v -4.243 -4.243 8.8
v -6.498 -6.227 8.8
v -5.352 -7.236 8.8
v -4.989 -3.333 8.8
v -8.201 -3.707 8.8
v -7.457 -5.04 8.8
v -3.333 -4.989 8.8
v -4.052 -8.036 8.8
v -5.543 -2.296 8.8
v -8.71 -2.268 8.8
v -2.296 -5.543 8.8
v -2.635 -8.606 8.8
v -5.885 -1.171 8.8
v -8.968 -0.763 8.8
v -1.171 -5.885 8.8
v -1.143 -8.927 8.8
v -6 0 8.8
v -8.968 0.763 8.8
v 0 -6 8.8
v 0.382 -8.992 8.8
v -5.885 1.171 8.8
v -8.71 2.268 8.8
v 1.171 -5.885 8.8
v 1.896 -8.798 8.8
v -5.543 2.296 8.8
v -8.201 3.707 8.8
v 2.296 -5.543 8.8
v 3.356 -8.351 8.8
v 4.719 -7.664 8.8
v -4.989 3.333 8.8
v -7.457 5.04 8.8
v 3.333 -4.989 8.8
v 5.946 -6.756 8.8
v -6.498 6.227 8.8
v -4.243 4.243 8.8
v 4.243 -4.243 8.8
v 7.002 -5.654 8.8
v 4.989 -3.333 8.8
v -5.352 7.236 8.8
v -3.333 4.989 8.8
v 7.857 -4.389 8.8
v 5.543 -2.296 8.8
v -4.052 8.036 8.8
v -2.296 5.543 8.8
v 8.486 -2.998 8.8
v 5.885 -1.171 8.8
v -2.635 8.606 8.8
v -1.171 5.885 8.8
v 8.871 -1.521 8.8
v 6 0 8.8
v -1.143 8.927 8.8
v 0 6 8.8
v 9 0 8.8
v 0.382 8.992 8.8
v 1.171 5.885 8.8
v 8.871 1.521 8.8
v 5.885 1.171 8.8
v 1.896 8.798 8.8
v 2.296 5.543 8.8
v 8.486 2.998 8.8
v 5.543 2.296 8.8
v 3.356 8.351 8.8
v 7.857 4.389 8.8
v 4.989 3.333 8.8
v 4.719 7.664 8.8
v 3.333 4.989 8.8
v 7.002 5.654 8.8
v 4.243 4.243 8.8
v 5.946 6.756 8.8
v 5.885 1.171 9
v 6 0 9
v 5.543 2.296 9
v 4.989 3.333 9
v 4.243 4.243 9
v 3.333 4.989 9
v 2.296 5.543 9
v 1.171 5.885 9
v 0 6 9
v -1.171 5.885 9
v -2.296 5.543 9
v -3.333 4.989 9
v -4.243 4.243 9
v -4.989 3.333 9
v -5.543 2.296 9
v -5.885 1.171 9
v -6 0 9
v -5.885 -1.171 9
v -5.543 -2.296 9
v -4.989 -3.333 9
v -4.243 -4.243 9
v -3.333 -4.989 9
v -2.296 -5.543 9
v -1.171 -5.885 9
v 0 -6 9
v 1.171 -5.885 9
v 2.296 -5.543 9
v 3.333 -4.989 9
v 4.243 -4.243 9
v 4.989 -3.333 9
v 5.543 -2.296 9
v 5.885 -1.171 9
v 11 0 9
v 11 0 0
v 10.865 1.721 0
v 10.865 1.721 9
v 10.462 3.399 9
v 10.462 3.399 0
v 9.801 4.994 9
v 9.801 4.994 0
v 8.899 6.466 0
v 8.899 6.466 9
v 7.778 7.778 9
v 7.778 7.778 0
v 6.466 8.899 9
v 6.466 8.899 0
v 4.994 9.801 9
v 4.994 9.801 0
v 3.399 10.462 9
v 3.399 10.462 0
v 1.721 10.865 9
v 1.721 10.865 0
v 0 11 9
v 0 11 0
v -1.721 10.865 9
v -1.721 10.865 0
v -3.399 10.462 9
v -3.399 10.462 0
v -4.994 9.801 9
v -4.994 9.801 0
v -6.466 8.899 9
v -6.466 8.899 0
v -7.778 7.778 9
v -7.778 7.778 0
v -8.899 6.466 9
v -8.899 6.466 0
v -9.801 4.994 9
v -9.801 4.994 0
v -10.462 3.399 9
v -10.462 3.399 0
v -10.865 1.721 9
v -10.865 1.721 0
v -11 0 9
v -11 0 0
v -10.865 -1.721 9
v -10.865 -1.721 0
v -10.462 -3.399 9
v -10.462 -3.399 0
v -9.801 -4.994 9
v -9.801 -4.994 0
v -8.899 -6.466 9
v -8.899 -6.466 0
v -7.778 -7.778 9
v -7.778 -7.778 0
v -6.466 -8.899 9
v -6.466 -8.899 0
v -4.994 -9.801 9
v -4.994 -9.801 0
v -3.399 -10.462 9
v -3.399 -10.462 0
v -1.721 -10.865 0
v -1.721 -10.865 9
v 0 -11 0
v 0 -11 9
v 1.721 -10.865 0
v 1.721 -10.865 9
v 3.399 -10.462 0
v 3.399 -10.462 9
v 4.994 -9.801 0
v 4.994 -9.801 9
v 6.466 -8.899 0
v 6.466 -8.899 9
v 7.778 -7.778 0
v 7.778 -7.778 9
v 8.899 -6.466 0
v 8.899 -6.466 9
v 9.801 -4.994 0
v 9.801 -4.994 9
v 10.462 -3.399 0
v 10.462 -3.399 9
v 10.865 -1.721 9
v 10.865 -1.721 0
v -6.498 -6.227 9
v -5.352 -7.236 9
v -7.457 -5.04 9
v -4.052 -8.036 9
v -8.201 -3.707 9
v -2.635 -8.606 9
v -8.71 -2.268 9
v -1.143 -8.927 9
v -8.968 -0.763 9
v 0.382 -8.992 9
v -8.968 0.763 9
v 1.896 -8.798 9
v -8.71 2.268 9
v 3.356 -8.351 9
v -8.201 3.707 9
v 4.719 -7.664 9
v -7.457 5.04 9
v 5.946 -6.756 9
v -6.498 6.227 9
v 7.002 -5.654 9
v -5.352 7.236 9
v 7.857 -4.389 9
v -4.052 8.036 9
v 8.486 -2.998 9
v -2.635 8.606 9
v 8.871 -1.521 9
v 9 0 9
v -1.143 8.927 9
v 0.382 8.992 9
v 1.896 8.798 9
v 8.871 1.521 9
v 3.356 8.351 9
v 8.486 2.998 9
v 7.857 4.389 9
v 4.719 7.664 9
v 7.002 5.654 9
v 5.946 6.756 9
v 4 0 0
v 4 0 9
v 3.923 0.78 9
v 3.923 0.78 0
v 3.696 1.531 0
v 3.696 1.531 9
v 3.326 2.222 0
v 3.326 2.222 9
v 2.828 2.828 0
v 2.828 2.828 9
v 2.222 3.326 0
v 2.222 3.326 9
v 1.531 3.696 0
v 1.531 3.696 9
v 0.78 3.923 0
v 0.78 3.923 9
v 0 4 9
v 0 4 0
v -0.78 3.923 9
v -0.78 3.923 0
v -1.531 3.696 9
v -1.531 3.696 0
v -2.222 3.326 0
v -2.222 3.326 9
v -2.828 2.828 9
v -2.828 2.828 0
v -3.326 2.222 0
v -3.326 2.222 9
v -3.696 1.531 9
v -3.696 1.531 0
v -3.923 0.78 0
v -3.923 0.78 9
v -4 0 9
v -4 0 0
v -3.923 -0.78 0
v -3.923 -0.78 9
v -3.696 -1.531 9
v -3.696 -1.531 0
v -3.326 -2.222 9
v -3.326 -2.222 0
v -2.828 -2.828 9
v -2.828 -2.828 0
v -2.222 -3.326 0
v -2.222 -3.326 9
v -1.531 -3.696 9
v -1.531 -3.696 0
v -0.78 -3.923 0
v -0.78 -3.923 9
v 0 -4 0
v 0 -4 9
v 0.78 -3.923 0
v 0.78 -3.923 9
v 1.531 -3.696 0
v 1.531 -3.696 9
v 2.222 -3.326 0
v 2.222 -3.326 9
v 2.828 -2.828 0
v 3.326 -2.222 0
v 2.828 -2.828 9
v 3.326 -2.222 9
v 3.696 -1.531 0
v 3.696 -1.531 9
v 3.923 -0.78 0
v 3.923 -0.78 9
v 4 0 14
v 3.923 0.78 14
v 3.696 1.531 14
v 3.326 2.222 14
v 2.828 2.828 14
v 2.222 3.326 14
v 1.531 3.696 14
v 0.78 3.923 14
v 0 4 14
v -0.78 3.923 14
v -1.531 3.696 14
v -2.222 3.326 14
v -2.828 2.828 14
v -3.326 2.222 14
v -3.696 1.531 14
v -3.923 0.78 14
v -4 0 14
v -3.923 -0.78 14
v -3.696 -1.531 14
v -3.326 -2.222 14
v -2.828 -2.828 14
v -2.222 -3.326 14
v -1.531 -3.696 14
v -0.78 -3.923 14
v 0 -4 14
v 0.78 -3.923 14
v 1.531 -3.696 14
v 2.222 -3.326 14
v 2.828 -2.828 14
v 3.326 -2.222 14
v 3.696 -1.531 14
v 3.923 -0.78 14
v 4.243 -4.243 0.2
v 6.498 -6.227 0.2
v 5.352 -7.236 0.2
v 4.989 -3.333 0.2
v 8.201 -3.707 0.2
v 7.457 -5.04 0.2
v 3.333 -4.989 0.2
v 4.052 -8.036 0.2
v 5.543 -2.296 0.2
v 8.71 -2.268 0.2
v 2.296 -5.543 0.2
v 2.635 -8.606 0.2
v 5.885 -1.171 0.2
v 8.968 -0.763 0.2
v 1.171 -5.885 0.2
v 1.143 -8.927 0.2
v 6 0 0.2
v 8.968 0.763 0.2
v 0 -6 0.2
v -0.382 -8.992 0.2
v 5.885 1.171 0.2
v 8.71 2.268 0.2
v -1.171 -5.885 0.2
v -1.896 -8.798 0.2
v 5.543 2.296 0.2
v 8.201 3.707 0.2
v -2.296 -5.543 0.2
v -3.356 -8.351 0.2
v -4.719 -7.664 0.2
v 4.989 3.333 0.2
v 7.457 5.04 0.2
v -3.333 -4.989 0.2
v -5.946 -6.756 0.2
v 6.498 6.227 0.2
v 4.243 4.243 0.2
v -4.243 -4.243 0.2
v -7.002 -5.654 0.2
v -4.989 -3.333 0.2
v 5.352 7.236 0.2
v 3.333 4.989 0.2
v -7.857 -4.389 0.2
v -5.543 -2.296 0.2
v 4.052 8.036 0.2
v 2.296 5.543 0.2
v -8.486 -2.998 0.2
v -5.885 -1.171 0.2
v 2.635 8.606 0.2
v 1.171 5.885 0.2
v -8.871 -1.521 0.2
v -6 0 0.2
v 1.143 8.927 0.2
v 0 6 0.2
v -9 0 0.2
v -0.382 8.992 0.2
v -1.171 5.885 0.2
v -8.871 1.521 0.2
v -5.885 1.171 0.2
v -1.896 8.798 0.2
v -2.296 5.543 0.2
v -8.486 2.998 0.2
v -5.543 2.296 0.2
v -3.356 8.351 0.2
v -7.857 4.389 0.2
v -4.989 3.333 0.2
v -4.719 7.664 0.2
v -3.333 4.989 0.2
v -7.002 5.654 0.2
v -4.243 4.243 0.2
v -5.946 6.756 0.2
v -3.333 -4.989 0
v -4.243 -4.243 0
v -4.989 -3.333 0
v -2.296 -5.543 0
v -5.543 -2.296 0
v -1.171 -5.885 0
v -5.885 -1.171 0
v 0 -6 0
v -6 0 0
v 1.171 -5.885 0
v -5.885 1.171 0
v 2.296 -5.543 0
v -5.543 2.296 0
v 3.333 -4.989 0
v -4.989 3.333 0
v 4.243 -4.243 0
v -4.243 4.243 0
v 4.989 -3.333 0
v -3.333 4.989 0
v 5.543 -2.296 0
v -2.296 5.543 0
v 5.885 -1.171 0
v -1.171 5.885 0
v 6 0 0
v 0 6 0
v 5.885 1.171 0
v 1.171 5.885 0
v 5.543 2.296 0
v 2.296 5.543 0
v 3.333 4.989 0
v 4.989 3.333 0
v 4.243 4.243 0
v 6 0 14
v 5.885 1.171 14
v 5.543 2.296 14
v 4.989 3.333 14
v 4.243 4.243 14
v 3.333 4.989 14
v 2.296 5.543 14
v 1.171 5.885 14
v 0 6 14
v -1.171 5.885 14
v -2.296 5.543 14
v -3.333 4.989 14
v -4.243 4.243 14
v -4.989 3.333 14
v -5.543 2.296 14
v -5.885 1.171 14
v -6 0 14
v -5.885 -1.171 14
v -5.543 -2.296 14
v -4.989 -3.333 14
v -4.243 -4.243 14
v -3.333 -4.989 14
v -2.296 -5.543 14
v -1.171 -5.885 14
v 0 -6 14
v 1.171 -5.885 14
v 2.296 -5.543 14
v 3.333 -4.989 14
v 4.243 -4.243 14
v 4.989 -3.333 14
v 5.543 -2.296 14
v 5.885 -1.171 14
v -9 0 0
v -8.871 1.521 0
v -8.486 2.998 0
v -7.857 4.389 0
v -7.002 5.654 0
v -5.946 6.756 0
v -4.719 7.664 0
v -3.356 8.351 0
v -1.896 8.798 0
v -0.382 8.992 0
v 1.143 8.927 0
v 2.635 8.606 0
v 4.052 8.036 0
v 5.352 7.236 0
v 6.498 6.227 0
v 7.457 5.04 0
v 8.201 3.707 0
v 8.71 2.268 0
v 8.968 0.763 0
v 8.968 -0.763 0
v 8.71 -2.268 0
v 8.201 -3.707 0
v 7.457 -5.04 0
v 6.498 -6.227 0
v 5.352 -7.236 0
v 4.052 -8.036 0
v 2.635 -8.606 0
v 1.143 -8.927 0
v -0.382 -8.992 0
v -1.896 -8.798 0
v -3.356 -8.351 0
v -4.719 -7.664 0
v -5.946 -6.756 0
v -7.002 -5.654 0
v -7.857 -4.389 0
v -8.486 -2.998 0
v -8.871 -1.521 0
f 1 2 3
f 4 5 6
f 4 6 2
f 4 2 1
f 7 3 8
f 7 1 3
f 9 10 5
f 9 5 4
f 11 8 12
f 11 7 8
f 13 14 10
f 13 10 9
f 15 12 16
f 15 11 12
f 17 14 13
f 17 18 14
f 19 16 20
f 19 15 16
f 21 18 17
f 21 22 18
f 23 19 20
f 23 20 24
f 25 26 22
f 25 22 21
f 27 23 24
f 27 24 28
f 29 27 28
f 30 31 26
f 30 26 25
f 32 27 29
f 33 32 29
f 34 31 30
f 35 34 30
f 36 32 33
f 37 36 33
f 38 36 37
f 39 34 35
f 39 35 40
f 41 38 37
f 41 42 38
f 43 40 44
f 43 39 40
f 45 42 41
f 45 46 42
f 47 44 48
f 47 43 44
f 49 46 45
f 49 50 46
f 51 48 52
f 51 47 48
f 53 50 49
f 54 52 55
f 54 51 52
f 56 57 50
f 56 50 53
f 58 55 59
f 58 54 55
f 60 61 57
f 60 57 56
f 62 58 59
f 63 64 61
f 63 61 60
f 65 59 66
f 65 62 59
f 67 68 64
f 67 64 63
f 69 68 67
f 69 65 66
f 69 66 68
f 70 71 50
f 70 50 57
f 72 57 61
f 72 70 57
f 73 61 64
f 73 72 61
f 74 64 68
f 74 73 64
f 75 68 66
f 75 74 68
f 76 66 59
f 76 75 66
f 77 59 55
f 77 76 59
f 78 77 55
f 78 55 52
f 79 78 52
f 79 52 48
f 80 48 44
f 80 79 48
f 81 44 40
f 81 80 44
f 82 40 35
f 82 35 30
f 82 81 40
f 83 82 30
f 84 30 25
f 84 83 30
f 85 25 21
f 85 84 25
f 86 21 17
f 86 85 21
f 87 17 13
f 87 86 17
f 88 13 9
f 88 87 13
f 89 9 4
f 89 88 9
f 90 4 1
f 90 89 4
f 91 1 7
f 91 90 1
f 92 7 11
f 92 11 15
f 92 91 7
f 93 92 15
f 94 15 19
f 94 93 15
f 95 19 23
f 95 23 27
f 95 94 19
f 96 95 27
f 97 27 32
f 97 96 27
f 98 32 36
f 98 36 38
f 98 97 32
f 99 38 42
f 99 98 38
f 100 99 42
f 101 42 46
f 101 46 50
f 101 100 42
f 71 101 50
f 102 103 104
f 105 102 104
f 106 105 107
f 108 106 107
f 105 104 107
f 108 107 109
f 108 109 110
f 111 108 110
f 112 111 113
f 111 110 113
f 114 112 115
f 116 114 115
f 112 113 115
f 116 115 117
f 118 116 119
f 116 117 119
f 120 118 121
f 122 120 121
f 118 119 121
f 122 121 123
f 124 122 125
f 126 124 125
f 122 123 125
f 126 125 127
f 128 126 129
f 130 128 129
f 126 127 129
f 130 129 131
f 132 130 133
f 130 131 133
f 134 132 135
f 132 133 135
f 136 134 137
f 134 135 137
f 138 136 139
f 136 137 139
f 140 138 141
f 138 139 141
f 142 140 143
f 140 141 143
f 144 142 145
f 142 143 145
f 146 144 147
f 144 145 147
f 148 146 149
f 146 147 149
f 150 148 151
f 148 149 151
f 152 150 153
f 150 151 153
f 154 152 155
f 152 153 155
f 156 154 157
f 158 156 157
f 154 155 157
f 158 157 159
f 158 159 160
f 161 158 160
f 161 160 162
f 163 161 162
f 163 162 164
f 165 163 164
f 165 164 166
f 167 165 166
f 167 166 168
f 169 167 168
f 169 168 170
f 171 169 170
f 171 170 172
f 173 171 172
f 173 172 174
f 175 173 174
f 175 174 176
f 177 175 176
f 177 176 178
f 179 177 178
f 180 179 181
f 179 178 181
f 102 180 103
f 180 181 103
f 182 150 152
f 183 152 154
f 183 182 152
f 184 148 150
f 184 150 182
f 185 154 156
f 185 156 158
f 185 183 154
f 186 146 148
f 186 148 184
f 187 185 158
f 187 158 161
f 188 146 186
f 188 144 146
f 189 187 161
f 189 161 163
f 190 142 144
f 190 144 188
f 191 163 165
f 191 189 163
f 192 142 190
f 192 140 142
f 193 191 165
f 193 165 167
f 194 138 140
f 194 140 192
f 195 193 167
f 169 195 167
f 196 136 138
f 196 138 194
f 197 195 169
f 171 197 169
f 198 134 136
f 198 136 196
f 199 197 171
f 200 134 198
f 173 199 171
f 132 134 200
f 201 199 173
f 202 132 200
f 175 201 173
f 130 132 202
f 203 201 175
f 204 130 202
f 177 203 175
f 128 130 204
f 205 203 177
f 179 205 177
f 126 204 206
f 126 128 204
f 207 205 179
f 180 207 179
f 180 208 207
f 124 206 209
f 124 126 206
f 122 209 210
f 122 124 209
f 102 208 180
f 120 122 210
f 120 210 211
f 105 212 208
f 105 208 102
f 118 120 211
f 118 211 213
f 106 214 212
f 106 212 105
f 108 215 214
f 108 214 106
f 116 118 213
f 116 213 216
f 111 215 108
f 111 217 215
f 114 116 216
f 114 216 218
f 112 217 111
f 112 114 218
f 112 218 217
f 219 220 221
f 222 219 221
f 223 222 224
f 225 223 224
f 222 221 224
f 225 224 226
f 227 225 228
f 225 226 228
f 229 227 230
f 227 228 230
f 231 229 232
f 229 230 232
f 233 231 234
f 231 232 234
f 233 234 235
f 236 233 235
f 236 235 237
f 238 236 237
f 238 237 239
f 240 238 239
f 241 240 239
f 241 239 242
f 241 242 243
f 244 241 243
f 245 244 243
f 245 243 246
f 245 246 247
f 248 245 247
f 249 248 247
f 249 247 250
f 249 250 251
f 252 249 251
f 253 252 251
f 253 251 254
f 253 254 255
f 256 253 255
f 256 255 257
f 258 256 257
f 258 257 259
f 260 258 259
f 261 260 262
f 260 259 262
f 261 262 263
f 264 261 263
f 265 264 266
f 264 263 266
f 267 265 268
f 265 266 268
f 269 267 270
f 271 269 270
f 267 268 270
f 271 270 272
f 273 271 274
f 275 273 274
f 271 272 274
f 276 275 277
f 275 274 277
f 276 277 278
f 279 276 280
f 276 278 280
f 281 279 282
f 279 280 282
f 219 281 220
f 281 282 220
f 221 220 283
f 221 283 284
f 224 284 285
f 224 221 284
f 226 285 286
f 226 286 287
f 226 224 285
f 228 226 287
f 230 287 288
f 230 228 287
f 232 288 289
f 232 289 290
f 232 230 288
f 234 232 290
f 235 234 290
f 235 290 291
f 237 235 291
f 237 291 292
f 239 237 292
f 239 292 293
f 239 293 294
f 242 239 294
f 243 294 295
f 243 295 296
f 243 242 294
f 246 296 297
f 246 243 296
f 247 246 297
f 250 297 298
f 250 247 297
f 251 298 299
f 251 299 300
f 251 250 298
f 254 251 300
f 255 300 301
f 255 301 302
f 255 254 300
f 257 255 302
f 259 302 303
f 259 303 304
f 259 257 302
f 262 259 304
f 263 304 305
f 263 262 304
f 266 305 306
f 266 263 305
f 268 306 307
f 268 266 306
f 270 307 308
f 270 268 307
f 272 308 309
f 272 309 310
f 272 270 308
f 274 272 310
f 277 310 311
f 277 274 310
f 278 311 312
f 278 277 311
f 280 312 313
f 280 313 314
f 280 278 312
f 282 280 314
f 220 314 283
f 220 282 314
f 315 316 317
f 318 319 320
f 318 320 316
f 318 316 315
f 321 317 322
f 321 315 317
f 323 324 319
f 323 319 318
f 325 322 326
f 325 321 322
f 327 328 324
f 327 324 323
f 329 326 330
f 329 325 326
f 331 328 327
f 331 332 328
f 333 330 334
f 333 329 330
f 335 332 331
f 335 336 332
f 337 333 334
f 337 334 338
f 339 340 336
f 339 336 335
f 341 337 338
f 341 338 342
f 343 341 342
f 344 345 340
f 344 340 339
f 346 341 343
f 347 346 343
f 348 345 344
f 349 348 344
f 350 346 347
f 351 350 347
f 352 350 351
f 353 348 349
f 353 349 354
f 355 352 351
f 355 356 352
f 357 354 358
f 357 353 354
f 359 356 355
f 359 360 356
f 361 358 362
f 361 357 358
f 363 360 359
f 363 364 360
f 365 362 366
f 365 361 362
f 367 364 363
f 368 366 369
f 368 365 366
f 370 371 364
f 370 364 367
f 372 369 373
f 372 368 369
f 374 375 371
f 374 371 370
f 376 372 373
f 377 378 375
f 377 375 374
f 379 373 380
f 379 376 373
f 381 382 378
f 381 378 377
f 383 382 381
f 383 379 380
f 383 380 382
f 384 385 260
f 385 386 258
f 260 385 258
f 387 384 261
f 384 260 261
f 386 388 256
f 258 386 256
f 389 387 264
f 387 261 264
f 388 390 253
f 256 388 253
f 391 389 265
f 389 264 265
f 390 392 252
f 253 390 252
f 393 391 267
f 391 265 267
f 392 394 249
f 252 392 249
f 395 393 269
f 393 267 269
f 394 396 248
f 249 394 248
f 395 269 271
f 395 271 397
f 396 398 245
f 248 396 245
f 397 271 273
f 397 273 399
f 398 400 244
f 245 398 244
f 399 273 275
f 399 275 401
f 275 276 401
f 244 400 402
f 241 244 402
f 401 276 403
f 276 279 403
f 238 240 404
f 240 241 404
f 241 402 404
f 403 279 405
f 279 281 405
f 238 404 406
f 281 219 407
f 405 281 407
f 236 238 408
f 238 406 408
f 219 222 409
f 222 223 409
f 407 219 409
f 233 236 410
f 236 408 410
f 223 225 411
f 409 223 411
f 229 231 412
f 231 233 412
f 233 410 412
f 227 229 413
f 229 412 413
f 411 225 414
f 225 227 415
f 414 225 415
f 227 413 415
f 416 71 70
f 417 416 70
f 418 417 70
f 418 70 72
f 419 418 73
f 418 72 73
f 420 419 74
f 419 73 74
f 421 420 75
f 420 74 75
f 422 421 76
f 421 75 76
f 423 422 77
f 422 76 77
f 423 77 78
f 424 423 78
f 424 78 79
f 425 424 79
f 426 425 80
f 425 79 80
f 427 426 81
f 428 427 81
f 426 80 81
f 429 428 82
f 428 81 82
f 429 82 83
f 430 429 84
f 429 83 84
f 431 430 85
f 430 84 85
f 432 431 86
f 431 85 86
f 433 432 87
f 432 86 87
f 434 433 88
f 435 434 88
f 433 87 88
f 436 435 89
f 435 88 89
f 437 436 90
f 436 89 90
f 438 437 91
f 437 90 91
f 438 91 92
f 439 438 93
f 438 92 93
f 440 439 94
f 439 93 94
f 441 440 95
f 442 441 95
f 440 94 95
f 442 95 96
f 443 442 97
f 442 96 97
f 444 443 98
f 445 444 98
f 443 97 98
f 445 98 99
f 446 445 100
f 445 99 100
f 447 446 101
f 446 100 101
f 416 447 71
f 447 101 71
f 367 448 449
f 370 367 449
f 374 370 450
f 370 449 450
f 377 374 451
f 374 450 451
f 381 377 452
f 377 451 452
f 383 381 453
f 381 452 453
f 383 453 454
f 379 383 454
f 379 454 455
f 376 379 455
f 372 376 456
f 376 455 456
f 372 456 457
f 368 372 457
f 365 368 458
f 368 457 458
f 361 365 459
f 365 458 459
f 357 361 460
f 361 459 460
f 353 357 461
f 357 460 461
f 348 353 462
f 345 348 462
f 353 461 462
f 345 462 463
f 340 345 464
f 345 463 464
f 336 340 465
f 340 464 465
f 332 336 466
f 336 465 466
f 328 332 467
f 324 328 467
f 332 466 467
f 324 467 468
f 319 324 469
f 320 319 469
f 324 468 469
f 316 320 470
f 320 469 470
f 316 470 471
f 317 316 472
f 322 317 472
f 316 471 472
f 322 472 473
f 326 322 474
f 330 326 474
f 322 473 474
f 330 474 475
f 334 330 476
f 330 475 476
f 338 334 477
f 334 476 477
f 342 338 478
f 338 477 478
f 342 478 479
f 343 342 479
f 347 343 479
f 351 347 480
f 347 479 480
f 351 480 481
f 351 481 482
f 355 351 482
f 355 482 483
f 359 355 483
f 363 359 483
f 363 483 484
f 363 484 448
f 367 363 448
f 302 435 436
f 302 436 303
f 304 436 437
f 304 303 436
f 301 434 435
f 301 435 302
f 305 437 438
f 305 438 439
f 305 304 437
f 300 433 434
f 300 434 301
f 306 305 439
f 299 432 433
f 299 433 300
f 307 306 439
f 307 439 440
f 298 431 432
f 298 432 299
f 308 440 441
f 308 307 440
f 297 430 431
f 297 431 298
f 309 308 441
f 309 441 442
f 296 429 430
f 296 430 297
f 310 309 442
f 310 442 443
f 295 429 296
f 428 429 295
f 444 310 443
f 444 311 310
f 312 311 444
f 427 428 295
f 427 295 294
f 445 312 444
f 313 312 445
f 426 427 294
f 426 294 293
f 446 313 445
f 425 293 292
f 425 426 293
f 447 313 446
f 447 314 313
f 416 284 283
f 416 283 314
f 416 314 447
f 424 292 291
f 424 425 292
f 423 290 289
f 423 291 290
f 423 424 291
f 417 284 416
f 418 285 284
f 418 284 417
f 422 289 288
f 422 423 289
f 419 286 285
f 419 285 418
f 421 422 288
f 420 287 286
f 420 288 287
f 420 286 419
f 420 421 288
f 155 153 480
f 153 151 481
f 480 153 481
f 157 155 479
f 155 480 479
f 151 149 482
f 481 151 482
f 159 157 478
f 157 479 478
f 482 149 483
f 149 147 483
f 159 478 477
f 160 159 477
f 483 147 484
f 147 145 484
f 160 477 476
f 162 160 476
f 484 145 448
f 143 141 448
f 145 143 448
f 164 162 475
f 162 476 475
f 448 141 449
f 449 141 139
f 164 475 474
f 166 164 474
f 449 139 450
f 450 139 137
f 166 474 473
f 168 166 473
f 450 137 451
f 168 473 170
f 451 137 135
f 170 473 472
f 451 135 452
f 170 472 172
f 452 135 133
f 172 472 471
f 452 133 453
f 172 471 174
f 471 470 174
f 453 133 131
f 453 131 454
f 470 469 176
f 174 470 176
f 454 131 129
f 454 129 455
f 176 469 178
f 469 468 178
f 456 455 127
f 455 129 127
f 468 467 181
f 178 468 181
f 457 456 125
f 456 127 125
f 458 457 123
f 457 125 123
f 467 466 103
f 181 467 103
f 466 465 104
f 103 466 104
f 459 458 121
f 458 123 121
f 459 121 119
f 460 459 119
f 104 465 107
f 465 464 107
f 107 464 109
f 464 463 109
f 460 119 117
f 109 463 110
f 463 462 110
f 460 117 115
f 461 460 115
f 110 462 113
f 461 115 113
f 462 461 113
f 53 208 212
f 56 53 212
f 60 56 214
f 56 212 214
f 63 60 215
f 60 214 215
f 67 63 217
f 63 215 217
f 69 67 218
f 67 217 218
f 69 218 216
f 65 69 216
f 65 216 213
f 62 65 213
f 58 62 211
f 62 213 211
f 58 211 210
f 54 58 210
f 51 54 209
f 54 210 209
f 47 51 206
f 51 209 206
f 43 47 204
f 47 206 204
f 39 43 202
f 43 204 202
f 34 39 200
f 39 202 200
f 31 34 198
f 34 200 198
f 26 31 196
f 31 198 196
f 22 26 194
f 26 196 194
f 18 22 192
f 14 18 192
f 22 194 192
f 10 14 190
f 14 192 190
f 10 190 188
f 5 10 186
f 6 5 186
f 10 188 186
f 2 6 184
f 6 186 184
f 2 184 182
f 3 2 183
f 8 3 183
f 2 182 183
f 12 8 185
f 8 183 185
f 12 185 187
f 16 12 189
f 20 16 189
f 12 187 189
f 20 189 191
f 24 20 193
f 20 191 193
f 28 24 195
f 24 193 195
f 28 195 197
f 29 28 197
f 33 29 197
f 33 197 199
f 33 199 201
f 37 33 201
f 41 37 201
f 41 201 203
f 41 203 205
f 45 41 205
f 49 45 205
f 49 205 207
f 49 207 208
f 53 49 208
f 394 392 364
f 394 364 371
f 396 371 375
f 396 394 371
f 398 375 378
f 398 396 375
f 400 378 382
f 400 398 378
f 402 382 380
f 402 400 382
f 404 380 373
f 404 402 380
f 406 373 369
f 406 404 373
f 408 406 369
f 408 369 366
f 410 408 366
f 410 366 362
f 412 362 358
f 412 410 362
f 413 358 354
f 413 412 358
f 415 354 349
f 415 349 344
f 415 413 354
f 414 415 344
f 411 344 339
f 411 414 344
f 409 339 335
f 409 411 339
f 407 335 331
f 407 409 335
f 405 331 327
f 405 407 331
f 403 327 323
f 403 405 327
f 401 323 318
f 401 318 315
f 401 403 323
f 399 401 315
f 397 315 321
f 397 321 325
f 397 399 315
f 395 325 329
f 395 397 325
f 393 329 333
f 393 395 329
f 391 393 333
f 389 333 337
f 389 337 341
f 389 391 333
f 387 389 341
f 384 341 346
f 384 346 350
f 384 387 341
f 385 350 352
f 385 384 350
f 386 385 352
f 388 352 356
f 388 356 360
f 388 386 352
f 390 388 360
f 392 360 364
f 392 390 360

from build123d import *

# Parameters (mm, degrees)
SKETCH1_R           = 11
BOSS_EXTRUDE1_DEPTH = 9
SKETCH2_R           = 4
CUT_EXTRUDE1_DEPTH  = 10
SKETCH3_R           = 9
SKETCH3_R_2         = 6
CUT_EXTRUDE2_DEPTH  = 0.2
SKETCH4_R           = 9
SKETCH4_R_2         = 6
CUT_EXTRUDE3_DEPTH  = 0.2
SKETCH5_R           = 6
SKETCH5_R_2         = 4
BOSS_EXTRUDE2_DEPTH = 5


with BuildPart() as part:
    # Sketch1 → Boss-Extrude1 (new body)
    with BuildSketch(Plane.XY):
        Circle(SKETCH1_R)
    extrude(amount=BOSS_EXTRUDE1_DEPTH)

    # Sketch2 → Cut-Extrude1 (cut, through all)
    with BuildSketch(Plane.XY.offset(9)):
        Circle(SKETCH2_R)
    extrude(amount=-CUT_EXTRUDE1_DEPTH, mode=Mode.SUBTRACT)

    # Sketch3 → Cut-Extrude2 (cut)
    with BuildSketch(Plane.XY.offset(9)):
        Circle(SKETCH3_R)
        Circle(SKETCH3_R_2, mode=Mode.SUBTRACT)
    extrude(amount=-CUT_EXTRUDE2_DEPTH, mode=Mode.SUBTRACT)

    # Sketch4 → Cut-Extrude3 (cut)
    with BuildSketch(Plane(origin=(0, 0, 0), x_dir=(-1, 0, 0), z_dir=(0, 0, -1))):
        Circle(SKETCH4_R)
        Circle(SKETCH4_R_2, mode=Mode.SUBTRACT)
    extrude(amount=-CUT_EXTRUDE3_DEPTH, mode=Mode.SUBTRACT)

    # Sketch5 → Boss-Extrude2 (add)
    with BuildSketch(Plane.XY.offset(9)):
        Circle(SKETCH5_R)
        Circle(SKETCH5_R_2, mode=Mode.SUBTRACT)
    extrude(amount=BOSS_EXTRUDE2_DEPTH)


solid = part.part
